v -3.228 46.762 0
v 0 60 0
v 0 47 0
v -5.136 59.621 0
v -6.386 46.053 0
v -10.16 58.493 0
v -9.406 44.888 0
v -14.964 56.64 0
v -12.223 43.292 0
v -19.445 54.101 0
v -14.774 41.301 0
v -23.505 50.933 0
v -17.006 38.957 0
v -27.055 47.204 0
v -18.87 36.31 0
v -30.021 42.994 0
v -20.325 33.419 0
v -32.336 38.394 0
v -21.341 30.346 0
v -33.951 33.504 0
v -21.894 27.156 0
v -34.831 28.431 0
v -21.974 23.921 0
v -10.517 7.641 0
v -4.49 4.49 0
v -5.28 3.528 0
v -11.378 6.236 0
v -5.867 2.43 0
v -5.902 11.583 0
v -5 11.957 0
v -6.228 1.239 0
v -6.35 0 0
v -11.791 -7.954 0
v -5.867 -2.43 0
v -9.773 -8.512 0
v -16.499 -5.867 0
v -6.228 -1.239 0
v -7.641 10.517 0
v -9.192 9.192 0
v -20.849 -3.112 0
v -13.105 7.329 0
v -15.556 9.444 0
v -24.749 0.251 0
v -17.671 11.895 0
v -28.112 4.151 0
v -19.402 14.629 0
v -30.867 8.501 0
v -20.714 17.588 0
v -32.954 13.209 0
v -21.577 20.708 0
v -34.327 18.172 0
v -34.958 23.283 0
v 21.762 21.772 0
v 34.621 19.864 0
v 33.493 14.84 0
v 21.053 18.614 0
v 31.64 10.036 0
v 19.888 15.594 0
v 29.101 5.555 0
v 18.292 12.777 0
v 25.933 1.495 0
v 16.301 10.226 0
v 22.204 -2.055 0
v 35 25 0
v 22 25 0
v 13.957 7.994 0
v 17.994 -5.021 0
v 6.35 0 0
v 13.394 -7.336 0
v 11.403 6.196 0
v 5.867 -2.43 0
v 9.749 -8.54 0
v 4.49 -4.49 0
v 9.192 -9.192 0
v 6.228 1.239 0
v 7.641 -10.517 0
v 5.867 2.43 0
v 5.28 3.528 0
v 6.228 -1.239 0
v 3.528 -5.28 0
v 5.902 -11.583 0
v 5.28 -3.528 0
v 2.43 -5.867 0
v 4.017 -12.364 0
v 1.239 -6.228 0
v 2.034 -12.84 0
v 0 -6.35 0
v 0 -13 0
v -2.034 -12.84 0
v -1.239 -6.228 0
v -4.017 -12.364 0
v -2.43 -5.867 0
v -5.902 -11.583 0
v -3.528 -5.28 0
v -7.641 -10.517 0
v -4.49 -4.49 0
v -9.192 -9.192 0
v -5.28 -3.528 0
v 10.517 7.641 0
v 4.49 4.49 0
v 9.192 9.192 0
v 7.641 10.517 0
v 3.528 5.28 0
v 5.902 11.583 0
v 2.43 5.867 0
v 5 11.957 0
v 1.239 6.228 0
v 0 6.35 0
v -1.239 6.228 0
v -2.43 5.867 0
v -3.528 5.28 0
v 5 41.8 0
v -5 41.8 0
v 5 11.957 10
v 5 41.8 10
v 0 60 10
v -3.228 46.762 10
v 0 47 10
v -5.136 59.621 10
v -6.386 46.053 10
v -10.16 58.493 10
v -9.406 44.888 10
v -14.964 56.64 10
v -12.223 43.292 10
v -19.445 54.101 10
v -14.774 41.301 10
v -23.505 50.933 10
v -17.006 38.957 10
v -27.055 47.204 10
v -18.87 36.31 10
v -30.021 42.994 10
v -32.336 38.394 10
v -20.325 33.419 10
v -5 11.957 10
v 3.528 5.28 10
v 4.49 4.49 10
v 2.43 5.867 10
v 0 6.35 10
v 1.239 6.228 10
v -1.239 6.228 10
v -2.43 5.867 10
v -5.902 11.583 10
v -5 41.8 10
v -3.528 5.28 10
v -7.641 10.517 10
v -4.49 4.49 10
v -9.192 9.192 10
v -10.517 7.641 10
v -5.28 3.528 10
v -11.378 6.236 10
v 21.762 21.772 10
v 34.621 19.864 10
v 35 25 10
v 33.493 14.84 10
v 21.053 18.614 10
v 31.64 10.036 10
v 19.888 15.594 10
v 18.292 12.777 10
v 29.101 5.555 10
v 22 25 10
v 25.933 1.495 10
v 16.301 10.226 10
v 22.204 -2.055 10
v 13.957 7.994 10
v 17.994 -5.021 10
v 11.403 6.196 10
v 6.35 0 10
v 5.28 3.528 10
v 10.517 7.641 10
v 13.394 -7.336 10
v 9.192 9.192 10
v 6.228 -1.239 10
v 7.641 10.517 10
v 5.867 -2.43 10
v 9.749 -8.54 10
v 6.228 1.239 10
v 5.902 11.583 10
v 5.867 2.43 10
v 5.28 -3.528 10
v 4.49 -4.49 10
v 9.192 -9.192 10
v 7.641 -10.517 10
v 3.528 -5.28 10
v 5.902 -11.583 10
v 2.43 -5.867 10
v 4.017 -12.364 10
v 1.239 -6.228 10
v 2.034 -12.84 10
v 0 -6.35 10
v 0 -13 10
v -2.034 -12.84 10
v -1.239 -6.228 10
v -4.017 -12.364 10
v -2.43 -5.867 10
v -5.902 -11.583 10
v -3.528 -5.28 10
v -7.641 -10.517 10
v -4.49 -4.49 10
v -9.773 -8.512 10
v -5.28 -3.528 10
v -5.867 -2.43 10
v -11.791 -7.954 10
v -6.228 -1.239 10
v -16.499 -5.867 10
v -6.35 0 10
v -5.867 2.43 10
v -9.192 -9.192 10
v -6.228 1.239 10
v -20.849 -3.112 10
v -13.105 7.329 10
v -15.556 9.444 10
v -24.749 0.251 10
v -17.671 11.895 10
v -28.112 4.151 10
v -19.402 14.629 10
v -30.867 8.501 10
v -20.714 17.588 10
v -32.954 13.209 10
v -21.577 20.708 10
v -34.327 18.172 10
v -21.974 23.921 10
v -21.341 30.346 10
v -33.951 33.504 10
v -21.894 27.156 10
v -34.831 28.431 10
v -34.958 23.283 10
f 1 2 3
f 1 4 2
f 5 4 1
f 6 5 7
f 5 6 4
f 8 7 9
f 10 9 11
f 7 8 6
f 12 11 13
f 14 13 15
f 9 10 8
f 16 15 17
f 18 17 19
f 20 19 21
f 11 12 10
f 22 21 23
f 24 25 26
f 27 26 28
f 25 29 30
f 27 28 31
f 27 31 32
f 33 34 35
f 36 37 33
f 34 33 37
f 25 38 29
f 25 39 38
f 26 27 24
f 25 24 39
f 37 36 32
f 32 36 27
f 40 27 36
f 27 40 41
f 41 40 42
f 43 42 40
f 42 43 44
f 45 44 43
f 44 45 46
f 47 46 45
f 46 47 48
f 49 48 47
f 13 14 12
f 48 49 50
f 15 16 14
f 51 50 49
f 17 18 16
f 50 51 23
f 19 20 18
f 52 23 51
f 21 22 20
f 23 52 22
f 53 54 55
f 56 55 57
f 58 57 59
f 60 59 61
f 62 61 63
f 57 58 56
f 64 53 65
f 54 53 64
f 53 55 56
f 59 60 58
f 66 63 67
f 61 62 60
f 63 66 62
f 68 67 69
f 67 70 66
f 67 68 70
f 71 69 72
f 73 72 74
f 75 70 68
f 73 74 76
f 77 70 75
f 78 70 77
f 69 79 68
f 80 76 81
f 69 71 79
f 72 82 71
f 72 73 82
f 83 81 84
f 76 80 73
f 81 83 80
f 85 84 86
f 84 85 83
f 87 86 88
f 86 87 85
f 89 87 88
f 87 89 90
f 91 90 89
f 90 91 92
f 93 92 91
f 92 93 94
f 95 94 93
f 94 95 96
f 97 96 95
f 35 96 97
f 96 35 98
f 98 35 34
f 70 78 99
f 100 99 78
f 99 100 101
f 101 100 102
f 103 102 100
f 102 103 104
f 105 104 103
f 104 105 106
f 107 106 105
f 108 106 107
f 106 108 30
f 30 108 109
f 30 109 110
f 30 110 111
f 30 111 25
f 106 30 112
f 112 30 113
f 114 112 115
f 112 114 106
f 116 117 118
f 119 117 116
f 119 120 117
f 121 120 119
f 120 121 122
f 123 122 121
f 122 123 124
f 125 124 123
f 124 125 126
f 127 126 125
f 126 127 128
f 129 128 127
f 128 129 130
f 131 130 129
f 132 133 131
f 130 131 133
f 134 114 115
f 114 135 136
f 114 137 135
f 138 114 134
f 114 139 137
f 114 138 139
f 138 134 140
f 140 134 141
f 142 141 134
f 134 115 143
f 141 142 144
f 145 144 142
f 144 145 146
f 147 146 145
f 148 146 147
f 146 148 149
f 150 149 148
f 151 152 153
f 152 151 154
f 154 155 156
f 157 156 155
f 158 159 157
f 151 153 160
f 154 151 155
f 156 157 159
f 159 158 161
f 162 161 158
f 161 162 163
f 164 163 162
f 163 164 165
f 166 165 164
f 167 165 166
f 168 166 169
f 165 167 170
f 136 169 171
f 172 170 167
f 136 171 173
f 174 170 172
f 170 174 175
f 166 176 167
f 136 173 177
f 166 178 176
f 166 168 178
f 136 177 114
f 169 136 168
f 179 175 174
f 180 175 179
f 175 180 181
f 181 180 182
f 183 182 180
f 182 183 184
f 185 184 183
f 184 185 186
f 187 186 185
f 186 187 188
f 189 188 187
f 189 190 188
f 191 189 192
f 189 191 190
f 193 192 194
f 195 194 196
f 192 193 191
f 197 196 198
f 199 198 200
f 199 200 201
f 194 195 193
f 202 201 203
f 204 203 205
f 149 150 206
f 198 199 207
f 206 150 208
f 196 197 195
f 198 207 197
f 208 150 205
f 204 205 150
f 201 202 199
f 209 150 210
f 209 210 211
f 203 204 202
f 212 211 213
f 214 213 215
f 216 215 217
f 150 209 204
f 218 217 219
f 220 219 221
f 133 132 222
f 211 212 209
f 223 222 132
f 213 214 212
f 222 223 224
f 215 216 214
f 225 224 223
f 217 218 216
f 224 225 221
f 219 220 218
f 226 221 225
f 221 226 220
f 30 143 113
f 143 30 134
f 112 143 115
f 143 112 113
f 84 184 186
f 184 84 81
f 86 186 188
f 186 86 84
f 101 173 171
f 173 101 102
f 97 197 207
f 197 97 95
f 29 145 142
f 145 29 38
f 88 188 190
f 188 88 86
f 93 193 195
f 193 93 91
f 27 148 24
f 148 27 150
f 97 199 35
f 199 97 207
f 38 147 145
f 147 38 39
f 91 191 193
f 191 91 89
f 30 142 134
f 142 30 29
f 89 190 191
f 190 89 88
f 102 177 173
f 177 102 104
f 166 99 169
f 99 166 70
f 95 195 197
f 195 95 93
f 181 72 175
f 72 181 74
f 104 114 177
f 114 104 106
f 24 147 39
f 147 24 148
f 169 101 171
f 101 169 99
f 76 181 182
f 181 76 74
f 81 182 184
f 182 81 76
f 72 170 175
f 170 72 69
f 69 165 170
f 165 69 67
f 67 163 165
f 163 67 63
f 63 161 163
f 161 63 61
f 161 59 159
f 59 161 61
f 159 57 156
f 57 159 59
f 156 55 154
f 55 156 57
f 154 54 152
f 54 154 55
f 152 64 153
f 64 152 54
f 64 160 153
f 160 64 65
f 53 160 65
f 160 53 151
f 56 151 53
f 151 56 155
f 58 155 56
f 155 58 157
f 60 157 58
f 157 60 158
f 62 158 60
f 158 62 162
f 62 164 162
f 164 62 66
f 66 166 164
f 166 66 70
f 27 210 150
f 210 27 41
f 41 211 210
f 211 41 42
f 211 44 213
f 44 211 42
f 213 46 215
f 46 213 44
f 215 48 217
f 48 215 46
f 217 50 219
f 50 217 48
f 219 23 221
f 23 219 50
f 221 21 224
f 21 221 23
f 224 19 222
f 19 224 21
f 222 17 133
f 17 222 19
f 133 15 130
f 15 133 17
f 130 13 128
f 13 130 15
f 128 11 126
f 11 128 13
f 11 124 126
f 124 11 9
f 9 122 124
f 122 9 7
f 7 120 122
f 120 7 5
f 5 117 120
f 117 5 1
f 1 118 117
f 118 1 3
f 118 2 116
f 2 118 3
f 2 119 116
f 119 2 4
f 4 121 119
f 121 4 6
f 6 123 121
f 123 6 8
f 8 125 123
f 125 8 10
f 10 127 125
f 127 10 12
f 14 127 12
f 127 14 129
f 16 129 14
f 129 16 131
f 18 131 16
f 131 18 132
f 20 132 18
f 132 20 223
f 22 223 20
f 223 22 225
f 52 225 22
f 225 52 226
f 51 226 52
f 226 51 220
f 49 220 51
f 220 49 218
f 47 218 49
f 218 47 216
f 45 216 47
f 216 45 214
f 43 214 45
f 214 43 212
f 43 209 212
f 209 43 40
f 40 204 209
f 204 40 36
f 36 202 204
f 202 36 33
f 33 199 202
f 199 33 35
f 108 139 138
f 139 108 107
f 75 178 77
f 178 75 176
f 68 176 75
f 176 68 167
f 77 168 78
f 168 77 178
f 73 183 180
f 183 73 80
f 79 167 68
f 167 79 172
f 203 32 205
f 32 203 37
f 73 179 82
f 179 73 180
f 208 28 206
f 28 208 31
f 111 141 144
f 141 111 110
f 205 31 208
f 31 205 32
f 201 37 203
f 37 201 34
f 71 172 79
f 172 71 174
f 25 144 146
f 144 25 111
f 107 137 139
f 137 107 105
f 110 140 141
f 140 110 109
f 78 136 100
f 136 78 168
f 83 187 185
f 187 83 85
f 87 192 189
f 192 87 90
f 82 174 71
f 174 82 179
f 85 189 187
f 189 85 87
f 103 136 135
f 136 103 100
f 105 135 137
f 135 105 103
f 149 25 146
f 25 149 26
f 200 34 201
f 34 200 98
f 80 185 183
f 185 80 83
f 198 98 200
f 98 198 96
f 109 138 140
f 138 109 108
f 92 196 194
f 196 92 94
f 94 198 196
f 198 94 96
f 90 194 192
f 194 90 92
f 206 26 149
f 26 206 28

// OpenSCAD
$fn = 32;

// ----------------------------------------------------------------------
// Hook: 50 mm shank into a 22 mm curl, 10 mm thick
// ----------------------------------------------------------------------

// --- parameters (mm) ---
shank_len = 50;           // shank length from the boss centre
shank_w = 10;             // shank width
boss_d = 26;              // boss diameter
bore_d = 12.7;            // boss bore
curl_in = 22;             // curl inner radius
curl_out = 35;            // curl outer radius
curl_sweep = 270;         // curl sweep angle
hook_t = 10;              // hook thickness

shank_profile = [[-5, 41.8], [5, 41.8], [5, 11], [-5, 11]];
boss_profile = [[13, 0], [12.84, 2.034], [12.364, 4.017], [11.583, 5.902], [10.517, 7.641], [9.192, 9.192], [7.641, 10.517], [5.902, 11.583], [4.017, 12.364], [2.034, 12.84], [0, 13], [-2.034, 12.84], [-4.017, 12.364], [-5.902, 11.583], [-7.641, 10.517], [-9.192, 9.192], [-10.517, 7.641], [-11.583, 5.902], [-12.364, 4.017], [-12.84, 2.034], [-13, 0], [-12.84, -2.034], [-12.364, -4.017], [-11.583, -5.902], [-10.517, -7.641], [-9.192, -9.192], [-7.641, -10.517], [-5.902, -11.583], [-4.017, -12.364], [-2.034, -12.84], [0, -13], [2.034, -12.84], [4.017, -12.364], [5.902, -11.583], [7.641, -10.517], [9.192, -9.192], [10.517, -7.641], [11.583, -5.902], [12.364, -4.017], [12.84, -2.034]];
curl_profile = [[0, 60], [-5.136, 59.621], [-10.16, 58.493], [-14.964, 56.64], [-19.445, 54.101], [-23.505, 50.933], [-27.055, 47.204], [-30.021, 42.994], [-32.336, 38.394], [-33.951, 33.504], [-34.831, 28.431], [-34.958, 23.283], [-34.327, 18.172], [-32.954, 13.209], [-30.867, 8.501], [-28.112, 4.151], [-24.749, 0.251], [-20.849, -3.112], [-16.499, -5.867], [-11.791, -7.954], [-6.828, -9.327], [-1.717, -9.958], [3.431, -9.831], [8.504, -8.951], [13.394, -7.336], [17.994, -5.021], [22.204, -2.055], [25.933, 1.495], [29.101, 5.555], [31.64, 10.036], [33.493, 14.84], [34.621, 19.864], [35, 25], [22, 25], [21.762, 21.772], [21.053, 18.614], [19.888, 15.594], [18.292, 12.777], [16.301, 10.226], [13.957, 7.994], [11.31, 6.13], [8.419, 4.675], [5.346, 3.659], [2.156, 3.106], [-1.079, 3.026], [-4.292, 3.423], [-7.412, 4.286], [-10.371, 5.598], [-13.105, 7.329], [-15.556, 9.444], [-17.671, 11.895], [-19.402, 14.629], [-20.714, 17.588], [-21.577, 20.708], [-21.974, 23.921], [-21.894, 27.156], [-21.341, 30.346], [-20.325, 33.419], [-18.87, 36.31], [-17.006, 38.957], [-14.774, 41.301], [-12.223, 43.292], [-9.406, 44.888], [-6.386, 46.053], [-3.228, 46.762], [0, 47]];

difference() {
  union() {
    /* three overlapping outlines: shank, boss and the smooth curl */
    linear_extrude(height = hook_t) polygon(shank_profile);
    linear_extrude(height = hook_t) polygon(boss_profile);
    linear_extrude(height = hook_t) polygon(curl_profile);
  }
  translate([0, 0, -2.5]) cylinder(h = hook_t + 5, d = bore_d);
}
